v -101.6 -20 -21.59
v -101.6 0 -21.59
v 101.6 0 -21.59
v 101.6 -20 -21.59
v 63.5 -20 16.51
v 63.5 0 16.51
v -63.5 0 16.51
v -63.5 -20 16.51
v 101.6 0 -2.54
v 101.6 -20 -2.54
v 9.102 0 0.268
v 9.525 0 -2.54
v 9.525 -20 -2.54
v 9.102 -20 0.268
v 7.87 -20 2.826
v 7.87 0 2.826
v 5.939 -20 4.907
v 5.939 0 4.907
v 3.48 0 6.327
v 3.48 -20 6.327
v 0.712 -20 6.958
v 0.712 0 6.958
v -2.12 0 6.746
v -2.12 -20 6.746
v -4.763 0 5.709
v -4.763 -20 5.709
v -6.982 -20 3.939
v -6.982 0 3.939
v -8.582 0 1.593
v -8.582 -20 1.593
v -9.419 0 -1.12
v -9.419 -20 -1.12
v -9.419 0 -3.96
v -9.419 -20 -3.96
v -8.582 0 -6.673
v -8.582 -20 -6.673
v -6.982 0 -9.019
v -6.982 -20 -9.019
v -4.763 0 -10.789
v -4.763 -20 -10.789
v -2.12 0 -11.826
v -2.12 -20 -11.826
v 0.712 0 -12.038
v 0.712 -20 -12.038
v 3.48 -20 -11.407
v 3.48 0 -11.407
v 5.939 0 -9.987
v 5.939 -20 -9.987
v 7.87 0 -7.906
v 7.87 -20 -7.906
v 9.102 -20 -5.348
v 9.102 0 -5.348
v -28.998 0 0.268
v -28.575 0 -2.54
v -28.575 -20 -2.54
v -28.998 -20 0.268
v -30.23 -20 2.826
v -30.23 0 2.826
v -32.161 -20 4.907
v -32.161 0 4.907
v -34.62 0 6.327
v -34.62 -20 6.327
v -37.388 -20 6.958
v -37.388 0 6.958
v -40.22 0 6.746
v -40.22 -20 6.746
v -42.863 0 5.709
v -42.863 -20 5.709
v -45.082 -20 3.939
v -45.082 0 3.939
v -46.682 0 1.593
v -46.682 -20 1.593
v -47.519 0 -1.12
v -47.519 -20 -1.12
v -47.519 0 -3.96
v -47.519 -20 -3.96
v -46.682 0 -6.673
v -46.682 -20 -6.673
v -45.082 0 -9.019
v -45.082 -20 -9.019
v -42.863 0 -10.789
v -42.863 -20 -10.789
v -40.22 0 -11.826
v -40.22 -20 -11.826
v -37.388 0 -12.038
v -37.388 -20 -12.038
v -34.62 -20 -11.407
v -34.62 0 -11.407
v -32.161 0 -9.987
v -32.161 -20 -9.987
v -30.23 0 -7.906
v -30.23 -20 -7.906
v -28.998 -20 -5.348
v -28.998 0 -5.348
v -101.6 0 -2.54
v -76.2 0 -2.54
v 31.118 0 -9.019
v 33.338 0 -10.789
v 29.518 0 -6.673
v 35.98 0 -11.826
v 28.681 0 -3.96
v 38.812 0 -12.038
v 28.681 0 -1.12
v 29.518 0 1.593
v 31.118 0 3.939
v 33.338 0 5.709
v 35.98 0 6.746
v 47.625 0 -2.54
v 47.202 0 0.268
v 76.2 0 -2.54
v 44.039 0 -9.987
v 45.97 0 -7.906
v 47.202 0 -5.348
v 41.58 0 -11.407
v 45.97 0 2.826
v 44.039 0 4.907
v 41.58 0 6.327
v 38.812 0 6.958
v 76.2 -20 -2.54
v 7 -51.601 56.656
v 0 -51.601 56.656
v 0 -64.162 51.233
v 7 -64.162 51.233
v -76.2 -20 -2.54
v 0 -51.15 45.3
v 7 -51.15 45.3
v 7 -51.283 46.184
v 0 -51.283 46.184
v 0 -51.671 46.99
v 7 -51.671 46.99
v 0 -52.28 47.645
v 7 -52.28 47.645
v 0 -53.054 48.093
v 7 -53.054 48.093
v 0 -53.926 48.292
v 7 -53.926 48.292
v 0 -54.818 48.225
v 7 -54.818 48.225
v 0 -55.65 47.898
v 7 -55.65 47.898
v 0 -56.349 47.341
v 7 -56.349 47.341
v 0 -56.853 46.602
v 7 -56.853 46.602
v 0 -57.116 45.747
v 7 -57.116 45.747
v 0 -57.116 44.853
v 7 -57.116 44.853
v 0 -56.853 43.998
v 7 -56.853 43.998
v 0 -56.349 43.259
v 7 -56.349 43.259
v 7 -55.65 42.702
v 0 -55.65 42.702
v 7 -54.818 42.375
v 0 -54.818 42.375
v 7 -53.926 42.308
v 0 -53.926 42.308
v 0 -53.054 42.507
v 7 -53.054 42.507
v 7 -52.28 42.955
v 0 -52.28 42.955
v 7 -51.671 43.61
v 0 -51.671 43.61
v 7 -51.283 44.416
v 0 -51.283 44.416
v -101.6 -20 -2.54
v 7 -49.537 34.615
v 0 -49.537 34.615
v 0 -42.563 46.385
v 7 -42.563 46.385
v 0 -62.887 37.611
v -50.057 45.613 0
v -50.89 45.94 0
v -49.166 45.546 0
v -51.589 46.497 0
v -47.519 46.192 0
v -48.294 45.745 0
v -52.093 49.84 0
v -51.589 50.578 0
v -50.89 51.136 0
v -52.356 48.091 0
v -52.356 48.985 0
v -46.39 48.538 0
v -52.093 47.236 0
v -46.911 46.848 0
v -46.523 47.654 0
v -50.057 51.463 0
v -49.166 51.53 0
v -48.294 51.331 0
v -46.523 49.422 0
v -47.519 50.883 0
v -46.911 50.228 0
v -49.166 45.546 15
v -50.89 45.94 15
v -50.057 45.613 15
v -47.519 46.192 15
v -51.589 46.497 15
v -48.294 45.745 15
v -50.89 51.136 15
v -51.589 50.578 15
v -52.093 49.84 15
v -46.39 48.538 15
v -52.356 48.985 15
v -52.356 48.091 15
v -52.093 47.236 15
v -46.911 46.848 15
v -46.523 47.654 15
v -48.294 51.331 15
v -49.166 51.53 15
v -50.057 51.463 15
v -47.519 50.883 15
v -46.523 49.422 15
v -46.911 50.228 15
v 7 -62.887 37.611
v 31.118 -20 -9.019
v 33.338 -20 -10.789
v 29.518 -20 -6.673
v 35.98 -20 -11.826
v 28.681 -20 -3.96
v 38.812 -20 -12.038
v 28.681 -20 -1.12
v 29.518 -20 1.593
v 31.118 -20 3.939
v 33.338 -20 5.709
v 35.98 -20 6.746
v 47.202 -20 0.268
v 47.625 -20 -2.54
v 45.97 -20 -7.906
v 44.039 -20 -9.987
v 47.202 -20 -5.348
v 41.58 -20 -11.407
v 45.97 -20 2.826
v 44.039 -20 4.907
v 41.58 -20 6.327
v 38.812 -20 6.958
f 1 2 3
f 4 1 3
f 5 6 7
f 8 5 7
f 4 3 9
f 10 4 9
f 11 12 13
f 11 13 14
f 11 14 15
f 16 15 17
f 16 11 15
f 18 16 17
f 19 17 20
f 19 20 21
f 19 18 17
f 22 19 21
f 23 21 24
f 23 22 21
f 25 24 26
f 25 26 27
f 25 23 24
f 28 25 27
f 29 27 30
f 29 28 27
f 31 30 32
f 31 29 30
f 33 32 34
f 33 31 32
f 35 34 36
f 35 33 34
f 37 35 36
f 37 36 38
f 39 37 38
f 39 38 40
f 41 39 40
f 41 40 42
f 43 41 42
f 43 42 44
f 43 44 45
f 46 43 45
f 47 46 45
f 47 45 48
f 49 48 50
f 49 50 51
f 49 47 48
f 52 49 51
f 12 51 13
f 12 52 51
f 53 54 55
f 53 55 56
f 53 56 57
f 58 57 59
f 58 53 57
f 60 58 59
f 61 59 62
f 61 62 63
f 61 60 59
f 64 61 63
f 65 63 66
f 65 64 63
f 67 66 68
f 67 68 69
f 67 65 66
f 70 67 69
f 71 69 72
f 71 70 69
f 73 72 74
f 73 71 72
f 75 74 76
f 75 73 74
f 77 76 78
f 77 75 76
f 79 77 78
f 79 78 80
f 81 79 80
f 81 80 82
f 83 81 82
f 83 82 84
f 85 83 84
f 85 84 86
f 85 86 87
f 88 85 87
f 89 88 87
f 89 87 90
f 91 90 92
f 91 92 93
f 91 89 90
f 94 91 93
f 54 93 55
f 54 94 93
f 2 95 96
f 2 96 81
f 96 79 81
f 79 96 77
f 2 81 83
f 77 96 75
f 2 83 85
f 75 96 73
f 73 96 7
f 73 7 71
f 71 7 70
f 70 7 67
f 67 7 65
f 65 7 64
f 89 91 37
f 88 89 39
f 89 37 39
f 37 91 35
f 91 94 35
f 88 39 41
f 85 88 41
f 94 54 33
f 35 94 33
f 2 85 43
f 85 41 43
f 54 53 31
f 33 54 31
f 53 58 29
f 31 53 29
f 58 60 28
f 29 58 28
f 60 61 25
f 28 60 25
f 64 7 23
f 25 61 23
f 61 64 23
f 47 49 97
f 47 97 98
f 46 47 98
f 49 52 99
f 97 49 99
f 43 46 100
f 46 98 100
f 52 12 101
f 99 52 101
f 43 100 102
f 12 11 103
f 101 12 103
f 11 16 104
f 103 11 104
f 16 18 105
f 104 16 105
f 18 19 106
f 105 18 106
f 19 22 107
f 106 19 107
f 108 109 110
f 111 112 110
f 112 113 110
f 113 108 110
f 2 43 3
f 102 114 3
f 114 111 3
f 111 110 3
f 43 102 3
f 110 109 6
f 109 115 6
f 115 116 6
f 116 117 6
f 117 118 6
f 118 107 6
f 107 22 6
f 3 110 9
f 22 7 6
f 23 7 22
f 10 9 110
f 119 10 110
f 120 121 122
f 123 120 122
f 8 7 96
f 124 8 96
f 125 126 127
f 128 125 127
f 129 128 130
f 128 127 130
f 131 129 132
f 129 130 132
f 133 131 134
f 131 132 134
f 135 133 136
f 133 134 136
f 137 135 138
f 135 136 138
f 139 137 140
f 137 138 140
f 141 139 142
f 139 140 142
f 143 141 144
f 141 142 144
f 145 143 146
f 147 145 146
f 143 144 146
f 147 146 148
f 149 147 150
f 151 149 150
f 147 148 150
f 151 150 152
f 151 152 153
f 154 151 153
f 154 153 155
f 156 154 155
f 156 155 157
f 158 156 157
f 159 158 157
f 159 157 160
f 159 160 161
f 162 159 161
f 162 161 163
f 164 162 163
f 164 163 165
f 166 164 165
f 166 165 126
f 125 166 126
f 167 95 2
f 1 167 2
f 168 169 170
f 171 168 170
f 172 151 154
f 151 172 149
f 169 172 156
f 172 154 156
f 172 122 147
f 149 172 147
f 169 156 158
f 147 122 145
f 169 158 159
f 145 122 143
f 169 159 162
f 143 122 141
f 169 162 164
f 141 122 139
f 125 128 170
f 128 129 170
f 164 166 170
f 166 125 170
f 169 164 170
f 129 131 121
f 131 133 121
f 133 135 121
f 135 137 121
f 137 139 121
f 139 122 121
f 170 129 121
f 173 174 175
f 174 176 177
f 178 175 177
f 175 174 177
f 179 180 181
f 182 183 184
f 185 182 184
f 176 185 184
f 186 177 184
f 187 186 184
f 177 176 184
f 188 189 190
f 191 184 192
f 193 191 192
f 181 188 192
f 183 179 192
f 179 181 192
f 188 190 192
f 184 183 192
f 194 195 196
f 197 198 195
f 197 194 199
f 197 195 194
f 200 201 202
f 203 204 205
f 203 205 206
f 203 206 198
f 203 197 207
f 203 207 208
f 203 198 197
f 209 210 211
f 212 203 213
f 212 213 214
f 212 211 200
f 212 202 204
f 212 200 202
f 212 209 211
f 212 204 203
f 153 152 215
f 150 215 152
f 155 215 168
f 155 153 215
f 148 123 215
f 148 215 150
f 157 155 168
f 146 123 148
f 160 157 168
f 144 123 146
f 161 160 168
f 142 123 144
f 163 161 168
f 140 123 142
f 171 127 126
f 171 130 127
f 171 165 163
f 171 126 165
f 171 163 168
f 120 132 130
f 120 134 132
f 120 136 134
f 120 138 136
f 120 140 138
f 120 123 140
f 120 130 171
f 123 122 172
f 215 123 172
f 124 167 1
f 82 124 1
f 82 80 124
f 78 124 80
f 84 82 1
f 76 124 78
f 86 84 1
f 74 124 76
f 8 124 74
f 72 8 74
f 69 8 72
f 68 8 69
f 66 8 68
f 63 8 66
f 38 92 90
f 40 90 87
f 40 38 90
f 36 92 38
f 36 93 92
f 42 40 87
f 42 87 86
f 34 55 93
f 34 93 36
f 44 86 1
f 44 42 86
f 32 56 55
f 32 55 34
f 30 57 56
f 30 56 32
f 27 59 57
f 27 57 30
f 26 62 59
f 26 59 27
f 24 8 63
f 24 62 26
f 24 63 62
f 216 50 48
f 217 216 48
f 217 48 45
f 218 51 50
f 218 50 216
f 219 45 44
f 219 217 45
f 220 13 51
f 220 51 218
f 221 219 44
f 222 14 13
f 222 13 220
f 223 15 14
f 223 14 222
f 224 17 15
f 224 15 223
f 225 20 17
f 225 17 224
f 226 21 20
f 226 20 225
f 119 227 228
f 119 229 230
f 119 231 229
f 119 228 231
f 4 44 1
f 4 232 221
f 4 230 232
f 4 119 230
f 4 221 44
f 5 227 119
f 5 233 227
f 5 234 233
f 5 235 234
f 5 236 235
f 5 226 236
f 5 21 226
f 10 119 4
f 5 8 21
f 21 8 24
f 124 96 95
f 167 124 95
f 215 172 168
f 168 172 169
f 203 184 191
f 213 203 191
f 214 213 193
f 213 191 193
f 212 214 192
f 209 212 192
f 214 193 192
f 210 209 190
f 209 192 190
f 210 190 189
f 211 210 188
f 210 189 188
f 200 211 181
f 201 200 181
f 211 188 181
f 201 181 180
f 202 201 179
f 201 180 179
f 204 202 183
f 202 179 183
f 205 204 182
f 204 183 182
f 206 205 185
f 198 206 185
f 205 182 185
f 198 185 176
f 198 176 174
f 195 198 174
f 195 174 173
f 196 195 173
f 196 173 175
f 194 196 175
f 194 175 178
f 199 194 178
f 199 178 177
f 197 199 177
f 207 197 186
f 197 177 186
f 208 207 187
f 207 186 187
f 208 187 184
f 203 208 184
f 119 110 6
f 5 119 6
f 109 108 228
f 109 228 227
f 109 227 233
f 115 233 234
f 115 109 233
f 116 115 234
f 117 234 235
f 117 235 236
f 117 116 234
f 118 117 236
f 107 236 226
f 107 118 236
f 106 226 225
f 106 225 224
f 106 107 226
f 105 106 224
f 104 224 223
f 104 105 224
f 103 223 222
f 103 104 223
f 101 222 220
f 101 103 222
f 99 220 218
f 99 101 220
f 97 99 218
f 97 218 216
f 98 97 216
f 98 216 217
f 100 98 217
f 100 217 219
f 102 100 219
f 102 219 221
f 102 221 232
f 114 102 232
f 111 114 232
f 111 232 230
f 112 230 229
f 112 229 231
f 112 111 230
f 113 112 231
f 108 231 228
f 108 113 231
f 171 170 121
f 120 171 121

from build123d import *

# Parameters (mm, degrees)
F0_R     = 9.525
F1_DEPTH = 20
F2_R     = 3
F3_DEPTH = 15
F5_DEPTH = 7
F7_D     = 6


with BuildPart() as f1:
    # F0 (on Front) → F1 (new body)
    with BuildSketch(Plane.XZ):
        Polygon((63.5, 16.51), (-63.5, 16.51), (-76.2, -2.54), (-101.6, -2.54), (-101.6, -21.59), (101.6, -21.59), (101.6, -2.54), (76.2, -2.54), align=None)
        with Locations((-38.1, -2.54)):
            Circle(F0_R, mode=Mode.SUBTRACT)
        with Locations((0, -2.54)):
            Circle(F0_R, mode=Mode.SUBTRACT)
        with Locations((38.1, -2.54)):
            Circle(F0_R, mode=Mode.SUBTRACT)
    extrude(amount=F1_DEPTH)


with BuildPart() as f3:
    # F2 (on Top) → F3 (new body)
    with BuildSketch(Plane.XY):
        with Locations((-49.389925, 48.537955)):
            Circle(F2_R)
    extrude(amount=F3_DEPTH)


with BuildPart() as f5:
    # F4 (on Right) → F5 (new body)
    with BuildSketch(Plane.YZ):
        Polygon((-49.537405, 34.615007), (-42.562597, 46.385001), (-51.601192, 56.655564), (-64.162158, 51.233129), (-62.886667, 37.611315), align=None)
    extrude(amount=F5_DEPTH)

    # F7 (through all)
    with Locations(Plane(origin=(0, 0, 0), x_dir=(0, -1, 0), z_dir=(-1, 0, 0))):
        with Locations((54.150004, 45.300003)):
            Hole(F7_D / 2)


solid = Compound([f1.part, f3.part, f5.part])
